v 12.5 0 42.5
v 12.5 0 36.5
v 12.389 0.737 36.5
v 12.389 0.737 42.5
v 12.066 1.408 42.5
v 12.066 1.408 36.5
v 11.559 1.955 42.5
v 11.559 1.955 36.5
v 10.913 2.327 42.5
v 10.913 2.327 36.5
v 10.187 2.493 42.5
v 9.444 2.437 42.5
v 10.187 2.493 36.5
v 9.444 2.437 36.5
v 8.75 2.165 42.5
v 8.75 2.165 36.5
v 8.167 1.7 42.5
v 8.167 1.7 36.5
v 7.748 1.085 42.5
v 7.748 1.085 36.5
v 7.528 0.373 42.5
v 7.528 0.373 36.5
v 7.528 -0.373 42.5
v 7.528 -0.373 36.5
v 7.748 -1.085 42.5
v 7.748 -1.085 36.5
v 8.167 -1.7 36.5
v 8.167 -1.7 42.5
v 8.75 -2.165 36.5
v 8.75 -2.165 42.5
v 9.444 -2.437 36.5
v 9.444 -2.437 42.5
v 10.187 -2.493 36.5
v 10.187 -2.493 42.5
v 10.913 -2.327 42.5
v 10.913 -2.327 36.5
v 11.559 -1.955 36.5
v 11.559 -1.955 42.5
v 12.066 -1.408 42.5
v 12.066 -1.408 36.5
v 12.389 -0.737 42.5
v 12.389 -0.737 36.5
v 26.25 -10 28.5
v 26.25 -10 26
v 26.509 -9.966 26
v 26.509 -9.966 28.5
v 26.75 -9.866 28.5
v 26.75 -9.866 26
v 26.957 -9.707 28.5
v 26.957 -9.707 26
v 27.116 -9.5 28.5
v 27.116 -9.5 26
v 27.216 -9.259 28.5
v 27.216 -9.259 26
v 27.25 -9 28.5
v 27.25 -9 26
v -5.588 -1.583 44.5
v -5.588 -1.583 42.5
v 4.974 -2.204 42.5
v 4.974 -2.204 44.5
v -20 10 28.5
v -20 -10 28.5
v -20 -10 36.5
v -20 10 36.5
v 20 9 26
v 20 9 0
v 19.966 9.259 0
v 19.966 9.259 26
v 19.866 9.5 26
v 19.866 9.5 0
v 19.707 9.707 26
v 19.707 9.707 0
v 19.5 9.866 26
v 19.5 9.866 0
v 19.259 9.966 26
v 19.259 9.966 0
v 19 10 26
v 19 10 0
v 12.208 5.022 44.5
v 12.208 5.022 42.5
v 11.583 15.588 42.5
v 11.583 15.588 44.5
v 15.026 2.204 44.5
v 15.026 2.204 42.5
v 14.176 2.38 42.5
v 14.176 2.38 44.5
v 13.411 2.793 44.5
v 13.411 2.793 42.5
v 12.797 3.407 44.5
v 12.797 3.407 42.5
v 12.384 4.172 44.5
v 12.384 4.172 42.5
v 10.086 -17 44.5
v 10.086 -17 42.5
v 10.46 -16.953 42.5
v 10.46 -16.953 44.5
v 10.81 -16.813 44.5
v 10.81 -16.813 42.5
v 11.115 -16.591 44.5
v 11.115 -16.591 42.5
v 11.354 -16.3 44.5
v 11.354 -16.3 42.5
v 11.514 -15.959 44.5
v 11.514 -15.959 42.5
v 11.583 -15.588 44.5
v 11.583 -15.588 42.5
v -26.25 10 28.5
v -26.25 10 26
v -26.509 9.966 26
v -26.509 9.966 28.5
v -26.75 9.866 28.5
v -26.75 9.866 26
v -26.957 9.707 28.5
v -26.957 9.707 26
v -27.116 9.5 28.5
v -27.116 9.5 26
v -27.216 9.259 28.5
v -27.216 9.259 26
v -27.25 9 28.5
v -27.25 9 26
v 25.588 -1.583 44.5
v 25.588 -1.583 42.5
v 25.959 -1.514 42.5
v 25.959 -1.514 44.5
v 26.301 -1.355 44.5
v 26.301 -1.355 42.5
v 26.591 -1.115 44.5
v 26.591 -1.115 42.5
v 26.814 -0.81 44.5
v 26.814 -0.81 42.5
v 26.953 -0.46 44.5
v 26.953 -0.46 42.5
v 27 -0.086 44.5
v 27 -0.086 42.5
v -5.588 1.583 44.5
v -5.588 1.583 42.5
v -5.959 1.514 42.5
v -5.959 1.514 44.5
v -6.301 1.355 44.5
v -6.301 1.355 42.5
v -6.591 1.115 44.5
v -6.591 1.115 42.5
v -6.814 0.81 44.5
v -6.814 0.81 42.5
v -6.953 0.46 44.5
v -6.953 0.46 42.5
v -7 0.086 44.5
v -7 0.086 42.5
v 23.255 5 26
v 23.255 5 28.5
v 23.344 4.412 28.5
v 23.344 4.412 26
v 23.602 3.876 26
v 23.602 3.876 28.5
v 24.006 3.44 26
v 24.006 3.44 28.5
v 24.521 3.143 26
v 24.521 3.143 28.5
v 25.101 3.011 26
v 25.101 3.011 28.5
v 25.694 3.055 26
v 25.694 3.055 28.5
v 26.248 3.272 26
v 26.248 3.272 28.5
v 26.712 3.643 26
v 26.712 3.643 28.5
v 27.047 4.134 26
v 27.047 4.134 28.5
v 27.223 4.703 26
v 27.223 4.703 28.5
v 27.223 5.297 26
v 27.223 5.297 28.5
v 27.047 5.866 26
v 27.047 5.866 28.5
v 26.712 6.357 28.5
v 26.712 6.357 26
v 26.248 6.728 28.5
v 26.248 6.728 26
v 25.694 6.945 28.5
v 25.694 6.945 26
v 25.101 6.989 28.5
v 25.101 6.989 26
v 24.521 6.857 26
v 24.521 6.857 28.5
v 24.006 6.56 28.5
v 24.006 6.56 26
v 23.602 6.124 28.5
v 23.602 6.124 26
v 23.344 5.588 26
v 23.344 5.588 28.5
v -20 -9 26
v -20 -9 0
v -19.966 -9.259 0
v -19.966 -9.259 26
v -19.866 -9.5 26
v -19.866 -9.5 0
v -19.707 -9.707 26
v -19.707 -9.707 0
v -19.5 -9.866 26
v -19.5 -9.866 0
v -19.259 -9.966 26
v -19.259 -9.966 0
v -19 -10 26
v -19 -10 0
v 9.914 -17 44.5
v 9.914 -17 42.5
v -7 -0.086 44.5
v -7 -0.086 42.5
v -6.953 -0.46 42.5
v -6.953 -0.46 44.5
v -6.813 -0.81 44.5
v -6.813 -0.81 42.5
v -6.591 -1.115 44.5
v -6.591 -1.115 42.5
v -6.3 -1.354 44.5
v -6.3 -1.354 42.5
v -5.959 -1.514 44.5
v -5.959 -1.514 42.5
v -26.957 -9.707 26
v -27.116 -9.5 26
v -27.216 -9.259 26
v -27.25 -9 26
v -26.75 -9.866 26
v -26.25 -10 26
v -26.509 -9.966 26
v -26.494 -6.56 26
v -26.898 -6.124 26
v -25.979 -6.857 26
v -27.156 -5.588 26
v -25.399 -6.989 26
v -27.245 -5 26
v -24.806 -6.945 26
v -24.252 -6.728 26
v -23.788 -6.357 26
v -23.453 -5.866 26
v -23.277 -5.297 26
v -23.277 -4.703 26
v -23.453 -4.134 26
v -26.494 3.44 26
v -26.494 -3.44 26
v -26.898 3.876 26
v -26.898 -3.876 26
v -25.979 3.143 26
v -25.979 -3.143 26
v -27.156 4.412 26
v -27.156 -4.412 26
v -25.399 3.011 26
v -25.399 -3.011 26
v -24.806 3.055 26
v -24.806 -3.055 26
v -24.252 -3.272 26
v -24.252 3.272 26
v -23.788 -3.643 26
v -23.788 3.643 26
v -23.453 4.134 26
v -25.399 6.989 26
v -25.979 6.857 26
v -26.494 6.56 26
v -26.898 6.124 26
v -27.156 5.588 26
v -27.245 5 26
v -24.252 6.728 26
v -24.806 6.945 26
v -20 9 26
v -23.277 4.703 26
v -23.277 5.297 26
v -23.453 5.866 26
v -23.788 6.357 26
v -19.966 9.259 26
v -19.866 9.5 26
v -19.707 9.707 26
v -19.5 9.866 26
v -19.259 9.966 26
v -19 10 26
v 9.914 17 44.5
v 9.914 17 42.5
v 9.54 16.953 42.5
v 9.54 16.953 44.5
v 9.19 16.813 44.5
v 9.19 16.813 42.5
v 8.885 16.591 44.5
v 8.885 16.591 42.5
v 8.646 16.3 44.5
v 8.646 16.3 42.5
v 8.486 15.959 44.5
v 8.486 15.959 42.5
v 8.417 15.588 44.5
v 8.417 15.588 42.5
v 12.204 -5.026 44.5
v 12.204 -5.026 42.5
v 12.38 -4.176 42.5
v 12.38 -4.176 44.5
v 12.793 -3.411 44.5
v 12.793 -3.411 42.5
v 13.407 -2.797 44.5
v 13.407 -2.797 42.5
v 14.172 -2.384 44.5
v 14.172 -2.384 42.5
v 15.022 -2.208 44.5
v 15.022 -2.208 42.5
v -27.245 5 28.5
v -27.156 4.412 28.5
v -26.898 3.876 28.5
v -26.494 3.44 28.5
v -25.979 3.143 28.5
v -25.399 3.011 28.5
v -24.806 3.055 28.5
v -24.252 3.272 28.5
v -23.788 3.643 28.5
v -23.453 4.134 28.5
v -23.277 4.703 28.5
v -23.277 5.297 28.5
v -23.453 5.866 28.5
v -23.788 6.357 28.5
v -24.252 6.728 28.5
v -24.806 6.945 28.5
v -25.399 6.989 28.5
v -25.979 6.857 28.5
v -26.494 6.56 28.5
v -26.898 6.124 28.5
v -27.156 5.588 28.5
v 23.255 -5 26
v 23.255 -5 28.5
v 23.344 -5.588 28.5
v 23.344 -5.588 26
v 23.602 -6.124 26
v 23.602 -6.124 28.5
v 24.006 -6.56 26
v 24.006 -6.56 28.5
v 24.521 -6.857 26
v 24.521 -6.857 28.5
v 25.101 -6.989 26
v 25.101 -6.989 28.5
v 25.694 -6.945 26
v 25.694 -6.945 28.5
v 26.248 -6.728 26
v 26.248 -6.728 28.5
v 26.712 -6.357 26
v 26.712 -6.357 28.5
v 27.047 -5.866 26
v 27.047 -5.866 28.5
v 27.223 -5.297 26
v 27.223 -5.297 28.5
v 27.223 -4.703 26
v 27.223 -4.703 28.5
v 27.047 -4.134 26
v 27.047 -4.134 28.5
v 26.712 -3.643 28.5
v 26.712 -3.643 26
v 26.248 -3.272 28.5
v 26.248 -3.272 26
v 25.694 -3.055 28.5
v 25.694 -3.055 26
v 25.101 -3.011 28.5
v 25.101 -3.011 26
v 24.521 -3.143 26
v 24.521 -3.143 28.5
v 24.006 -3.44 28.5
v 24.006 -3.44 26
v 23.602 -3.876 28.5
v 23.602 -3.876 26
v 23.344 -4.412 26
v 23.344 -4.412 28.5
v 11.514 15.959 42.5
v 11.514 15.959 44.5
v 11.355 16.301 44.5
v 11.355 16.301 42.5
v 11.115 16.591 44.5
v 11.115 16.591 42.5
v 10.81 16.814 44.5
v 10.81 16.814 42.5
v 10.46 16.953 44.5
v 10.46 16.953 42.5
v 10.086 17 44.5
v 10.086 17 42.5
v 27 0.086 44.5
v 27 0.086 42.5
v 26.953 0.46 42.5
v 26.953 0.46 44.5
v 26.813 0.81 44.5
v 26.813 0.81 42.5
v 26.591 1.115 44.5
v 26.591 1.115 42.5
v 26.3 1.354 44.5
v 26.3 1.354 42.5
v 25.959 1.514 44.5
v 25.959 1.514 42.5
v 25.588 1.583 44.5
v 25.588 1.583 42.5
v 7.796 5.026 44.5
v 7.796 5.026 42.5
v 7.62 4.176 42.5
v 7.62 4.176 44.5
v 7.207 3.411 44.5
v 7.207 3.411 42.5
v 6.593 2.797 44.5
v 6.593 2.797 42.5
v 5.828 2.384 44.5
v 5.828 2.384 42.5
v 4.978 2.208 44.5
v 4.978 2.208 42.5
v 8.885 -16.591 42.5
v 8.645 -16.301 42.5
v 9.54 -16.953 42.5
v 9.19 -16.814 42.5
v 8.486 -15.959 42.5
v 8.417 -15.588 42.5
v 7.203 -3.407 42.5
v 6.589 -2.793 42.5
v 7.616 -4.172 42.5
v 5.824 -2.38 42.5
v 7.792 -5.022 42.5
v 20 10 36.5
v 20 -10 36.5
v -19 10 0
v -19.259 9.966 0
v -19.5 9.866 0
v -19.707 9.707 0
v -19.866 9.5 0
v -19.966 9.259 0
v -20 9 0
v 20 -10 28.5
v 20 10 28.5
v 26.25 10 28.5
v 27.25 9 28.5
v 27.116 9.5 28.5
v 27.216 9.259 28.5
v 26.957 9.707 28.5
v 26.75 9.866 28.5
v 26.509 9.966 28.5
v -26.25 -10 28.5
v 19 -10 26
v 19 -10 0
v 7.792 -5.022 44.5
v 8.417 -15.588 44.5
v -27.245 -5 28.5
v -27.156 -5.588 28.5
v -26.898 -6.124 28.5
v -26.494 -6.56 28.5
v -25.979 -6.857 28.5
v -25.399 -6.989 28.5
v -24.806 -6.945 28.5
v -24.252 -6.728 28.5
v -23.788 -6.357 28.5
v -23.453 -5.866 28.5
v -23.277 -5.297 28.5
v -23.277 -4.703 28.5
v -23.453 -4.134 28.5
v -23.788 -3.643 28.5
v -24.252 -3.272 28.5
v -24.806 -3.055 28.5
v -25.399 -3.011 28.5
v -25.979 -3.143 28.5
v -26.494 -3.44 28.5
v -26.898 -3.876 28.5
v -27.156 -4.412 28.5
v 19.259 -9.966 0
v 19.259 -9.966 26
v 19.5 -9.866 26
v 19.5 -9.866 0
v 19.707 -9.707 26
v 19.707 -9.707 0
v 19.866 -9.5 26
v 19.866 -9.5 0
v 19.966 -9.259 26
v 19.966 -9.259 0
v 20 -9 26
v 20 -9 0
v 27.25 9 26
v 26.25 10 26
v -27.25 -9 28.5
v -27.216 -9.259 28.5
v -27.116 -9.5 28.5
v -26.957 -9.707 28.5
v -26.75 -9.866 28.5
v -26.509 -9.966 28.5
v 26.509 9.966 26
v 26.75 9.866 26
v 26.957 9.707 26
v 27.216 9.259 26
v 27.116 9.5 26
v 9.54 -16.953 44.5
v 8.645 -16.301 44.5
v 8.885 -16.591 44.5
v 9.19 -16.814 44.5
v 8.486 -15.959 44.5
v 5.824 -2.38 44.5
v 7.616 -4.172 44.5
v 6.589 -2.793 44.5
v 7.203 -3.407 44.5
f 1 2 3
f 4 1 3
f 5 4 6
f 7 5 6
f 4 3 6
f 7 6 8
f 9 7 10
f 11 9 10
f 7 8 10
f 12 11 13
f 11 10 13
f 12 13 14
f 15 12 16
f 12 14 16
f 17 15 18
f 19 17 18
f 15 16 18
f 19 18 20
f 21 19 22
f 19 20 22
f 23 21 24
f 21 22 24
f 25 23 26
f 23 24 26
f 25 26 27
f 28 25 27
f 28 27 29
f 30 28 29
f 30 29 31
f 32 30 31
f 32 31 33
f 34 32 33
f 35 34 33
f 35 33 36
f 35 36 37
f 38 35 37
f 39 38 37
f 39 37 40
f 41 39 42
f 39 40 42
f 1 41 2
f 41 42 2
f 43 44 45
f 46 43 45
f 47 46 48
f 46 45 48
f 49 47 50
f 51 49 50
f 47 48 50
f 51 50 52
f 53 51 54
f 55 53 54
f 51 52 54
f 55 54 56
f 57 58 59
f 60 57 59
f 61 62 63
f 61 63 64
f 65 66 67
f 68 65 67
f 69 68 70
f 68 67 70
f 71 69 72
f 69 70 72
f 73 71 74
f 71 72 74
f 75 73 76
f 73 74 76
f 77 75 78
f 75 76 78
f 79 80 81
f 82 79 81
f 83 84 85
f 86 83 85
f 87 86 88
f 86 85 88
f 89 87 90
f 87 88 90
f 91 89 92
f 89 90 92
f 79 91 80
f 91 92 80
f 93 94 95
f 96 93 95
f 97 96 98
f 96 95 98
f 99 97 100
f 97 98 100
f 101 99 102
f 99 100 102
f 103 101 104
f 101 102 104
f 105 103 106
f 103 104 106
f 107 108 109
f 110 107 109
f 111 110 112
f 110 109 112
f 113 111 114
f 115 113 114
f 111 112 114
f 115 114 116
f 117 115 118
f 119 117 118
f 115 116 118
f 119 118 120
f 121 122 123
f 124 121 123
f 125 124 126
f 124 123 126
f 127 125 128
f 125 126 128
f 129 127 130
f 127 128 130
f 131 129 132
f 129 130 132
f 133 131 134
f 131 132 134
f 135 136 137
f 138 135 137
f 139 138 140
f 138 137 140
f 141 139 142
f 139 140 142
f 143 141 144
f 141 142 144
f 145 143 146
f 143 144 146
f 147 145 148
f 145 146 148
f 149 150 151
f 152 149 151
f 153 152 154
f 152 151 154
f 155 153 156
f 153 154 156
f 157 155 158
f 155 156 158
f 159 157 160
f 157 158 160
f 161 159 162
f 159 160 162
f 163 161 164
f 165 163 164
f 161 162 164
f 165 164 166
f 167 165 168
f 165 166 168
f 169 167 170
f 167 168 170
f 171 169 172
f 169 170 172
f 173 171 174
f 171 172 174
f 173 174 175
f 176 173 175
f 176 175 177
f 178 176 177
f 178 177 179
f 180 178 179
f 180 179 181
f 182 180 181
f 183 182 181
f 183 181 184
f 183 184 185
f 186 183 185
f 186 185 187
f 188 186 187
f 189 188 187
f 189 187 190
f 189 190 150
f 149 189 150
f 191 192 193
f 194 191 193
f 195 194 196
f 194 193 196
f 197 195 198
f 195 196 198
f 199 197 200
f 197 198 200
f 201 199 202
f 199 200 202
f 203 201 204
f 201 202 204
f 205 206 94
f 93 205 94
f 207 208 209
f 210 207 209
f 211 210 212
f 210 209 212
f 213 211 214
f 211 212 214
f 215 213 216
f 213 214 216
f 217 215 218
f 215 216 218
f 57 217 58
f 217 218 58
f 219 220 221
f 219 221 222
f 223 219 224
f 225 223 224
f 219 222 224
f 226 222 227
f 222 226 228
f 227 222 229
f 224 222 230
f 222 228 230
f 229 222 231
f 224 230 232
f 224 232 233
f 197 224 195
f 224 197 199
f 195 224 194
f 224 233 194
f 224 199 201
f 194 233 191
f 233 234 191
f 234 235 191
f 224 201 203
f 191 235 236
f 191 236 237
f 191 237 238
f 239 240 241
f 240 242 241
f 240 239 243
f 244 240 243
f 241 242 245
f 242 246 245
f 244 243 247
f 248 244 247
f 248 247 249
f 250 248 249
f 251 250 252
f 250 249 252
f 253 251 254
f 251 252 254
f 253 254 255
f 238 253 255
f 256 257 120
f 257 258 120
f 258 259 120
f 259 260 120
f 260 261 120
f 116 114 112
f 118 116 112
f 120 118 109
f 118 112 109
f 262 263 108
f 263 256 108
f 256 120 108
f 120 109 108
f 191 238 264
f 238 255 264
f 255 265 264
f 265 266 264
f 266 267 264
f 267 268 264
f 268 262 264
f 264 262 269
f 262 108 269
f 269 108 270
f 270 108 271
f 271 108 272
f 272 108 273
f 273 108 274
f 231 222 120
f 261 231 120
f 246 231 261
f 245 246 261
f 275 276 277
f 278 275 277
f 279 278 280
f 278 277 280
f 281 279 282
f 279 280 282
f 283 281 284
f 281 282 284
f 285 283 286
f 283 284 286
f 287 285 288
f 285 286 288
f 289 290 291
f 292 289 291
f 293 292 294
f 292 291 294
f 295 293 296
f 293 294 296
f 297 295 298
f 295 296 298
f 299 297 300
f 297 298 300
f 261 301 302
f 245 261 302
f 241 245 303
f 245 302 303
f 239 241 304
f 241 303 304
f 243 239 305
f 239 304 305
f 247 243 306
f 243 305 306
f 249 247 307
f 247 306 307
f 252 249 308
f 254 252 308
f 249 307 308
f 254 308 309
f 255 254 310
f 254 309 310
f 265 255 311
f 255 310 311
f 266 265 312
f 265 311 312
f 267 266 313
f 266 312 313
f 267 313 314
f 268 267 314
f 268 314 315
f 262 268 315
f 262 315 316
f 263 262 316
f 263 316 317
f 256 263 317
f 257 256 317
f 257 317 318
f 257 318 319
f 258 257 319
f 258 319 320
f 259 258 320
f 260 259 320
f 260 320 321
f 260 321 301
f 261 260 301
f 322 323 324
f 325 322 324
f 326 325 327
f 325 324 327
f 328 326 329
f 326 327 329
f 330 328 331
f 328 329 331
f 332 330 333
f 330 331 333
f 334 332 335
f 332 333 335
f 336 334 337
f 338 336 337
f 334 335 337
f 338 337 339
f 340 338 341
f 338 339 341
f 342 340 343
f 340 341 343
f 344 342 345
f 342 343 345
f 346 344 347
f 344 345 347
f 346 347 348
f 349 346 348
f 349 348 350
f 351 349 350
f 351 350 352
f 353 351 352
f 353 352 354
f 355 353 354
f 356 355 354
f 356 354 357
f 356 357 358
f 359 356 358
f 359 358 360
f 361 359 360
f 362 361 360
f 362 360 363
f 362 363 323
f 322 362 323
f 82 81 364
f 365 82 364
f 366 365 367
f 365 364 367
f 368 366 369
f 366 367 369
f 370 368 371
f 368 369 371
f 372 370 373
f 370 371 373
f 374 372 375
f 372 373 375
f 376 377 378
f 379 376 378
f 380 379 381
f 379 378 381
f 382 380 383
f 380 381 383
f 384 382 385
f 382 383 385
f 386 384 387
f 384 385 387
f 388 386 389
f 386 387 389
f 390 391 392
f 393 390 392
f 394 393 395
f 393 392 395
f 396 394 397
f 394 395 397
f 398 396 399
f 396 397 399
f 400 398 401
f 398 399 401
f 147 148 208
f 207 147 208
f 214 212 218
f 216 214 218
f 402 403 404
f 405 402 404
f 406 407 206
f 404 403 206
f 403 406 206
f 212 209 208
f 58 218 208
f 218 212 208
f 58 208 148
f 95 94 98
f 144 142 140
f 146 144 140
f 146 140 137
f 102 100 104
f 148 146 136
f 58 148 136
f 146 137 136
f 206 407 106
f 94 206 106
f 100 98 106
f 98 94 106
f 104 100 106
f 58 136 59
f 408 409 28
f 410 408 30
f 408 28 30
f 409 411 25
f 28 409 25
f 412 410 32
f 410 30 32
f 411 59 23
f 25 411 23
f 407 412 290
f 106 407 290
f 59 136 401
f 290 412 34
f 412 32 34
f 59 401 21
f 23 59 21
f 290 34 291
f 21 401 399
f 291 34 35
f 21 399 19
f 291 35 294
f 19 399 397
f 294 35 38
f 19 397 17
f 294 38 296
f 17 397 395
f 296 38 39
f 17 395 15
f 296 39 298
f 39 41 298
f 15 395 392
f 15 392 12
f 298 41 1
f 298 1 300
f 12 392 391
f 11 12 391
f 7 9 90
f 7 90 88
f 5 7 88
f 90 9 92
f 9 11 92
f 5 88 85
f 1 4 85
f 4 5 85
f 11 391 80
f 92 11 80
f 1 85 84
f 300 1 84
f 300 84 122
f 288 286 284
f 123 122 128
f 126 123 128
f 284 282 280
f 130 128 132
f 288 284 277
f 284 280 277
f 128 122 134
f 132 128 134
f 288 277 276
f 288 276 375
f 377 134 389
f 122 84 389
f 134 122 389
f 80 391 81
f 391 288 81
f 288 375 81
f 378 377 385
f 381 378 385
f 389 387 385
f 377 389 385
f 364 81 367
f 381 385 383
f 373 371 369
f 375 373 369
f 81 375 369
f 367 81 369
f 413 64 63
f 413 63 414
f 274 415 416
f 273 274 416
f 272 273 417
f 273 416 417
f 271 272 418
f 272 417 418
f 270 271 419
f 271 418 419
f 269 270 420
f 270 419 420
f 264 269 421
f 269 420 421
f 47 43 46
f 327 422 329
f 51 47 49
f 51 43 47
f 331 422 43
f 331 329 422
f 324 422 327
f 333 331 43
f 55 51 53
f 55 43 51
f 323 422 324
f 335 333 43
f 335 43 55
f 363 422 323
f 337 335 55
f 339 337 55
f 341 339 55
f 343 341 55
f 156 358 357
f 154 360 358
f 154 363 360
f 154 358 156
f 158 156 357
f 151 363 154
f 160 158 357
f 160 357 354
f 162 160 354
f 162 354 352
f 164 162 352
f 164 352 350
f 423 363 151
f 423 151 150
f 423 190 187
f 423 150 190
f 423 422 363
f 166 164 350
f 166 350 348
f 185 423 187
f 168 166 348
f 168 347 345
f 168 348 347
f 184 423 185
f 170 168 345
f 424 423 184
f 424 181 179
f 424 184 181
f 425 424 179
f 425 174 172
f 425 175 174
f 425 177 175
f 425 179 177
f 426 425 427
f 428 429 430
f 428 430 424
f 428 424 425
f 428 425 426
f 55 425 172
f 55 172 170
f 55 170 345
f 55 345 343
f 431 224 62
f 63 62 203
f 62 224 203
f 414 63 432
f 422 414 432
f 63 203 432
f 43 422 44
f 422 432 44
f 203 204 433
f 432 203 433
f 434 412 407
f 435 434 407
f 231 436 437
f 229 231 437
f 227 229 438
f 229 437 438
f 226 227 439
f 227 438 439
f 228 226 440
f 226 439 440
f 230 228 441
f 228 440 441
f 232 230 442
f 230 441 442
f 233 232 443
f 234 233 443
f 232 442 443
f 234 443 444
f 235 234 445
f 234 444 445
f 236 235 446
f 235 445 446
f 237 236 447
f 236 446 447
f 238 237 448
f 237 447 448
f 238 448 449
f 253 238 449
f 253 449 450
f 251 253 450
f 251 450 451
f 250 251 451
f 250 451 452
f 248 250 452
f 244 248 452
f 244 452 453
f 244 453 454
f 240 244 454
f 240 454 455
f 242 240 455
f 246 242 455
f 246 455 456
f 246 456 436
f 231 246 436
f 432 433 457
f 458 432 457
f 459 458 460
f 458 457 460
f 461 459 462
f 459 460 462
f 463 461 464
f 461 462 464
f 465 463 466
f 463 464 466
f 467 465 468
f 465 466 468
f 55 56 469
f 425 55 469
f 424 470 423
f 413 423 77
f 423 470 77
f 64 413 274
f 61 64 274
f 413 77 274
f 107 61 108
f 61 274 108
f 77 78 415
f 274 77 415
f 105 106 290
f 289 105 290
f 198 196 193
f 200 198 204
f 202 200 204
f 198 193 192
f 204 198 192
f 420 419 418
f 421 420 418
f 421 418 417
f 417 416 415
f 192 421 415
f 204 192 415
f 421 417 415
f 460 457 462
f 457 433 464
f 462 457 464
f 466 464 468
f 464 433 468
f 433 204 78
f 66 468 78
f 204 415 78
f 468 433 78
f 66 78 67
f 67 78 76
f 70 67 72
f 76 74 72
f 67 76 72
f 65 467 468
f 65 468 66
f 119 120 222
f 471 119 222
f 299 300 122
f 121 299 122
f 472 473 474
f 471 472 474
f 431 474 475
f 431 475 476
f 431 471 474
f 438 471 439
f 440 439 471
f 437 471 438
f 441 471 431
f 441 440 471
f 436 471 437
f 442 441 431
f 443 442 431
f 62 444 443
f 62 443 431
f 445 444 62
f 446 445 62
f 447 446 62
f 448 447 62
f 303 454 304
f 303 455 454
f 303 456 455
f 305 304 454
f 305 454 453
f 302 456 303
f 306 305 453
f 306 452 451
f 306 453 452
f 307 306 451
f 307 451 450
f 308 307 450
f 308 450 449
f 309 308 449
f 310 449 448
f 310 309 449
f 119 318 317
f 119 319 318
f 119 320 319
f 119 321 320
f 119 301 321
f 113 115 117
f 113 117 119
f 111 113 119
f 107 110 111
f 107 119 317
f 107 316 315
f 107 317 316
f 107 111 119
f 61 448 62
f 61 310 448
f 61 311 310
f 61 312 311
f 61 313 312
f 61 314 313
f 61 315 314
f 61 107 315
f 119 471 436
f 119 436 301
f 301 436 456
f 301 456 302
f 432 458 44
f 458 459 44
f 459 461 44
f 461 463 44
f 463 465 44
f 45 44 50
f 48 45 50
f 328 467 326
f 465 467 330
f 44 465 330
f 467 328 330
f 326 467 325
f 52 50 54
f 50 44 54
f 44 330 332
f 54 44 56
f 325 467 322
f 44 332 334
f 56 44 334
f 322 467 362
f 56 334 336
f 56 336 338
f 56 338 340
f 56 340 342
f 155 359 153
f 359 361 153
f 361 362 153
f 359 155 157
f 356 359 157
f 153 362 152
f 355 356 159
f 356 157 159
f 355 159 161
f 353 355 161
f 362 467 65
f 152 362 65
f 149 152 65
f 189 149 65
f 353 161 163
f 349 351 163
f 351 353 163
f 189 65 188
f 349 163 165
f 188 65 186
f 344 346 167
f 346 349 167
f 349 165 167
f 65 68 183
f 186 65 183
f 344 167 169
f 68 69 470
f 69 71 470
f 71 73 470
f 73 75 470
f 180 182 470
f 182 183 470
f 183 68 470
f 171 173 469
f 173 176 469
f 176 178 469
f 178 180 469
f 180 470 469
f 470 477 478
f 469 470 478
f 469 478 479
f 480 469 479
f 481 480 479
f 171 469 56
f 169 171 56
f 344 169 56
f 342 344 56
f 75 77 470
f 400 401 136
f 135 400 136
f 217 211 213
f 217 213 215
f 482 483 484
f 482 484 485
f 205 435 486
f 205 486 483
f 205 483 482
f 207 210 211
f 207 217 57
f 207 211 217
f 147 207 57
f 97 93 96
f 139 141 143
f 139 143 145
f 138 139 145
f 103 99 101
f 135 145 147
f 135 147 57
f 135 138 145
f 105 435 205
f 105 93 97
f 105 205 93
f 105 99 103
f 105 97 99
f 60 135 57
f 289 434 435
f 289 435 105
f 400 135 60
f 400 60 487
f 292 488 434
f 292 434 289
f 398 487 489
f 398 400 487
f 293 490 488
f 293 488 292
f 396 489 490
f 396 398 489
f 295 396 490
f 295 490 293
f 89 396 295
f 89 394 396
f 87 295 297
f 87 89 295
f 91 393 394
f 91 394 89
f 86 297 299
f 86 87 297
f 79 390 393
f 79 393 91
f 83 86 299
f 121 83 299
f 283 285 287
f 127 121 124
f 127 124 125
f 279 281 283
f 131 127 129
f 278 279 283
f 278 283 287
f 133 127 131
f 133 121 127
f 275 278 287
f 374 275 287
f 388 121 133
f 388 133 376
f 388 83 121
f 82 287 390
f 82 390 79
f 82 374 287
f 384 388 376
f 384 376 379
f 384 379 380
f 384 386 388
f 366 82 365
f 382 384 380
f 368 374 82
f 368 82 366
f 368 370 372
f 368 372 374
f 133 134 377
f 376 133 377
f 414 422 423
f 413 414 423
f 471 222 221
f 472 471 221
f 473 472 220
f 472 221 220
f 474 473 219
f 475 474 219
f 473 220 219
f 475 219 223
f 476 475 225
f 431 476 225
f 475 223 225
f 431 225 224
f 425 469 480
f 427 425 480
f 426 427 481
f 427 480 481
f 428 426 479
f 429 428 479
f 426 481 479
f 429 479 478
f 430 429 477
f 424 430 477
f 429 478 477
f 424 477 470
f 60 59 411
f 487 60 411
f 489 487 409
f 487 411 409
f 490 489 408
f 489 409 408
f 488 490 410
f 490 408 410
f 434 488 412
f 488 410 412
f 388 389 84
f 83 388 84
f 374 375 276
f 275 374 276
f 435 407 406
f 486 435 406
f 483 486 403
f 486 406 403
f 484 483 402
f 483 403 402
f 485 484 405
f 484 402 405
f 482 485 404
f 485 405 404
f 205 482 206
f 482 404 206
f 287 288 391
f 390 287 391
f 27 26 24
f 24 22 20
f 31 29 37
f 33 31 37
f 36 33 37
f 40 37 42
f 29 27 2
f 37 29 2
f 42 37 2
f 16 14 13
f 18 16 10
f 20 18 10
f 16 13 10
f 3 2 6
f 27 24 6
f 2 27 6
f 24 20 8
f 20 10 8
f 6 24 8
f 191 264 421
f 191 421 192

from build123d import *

# Parameters (mm, degrees)
F1_DEPTH  = 26
F3_DEPTH  = 2.5
F4_D      = 3.99
F4_DEPTH  = 5
F5_W      = 40
F5_H      = 20
F6_DEPTH  = 8
F7_R      = 2.5
F8_DEPTH  = 6
F10_DEPTH = 2


with BuildPart() as f1:
    # F0 (on Top) → F1 (new body)
    with BuildSketch(Plane.XY):
        with BuildLine():
            Line((-19, -10), (19, -10))
            ThreePointArc((19, -10), (19.707107, -9.707107), (20, -9))
            Line((20, -9), (20, 9))
            ThreePointArc((20, 9), (19.707107, 9.707107), (19, 10))
            Line((19, 10), (-19, 10))
            ThreePointArc((-19, 10), (-19.707107, 9.707107), (-20, 9))
            Line((-20, 9), (-20, -9))
            ThreePointArc((-20, -9), (-19.707107, -9.707107), (-19, -10))
        make_face()
    extrude(amount=F1_DEPTH)

    # F2 (on face) → F3 (join)
    with BuildSketch(Plane.XY.offset(26)):
        with BuildLine():
            Line((-26.25, -10), (26.25, -10))
            ThreePointArc((26.25, -10), (26.957107, -9.707107), (27.25, -9))
            Line((27.25, -9), (27.25, 9))
            ThreePointArc((27.25, 9), (26.957107, 9.707107), (26.25, 10))
            Line((26.25, 10), (-26.25, 10))
            ThreePointArc((-26.25, 10), (-26.957107, 9.707107), (-27.25, 9))
            Line((-27.25, 9), (-27.25, -9))
            ThreePointArc((-27.25, -9), (-26.957107, -9.707107), (-26.25, -10))
        make_face()
    extrude(amount=F3_DEPTH)

    # F4
    with Locations(Plane(origin=(0, 0, 26), x_dir=(1, 0, 0), z_dir=(0, 0, -1))):
        with Locations((-25.25, 5), (-25.25, -5), (25.25, 5), (25.25, -5)):
            Hole(F4_D / 2, depth=F4_DEPTH)

    # F5 (on face) → F6 (join)
    with BuildSketch(Plane.XY.offset(28.5)):
        Rectangle(F5_W, F5_H)
    extrude(amount=F6_DEPTH)


with BuildPart() as f8:
    # F7 (on face) → F8 (new body)
    with BuildSketch(Plane.XY.offset(36.5)):
        with Locations((10, 0)):
            Circle(F7_R)
    extrude(amount=F8_DEPTH)

    # F9 (on face) → F10 (join)
    with BuildSketch(Plane.XY.offset(42.5)):
        with BuildLine():
            ThreePointArc((-5.588466, 1.583393), (-6.591489, 1.114912), (-7, 0.086004))
            Line((-7, 0.086004), (-7, -0.085642))
            ThreePointArc((-7, -0.085642), (-6.591358, -1.114689), (-5.588083, -1.583054))
            Line((-5.588083, -1.583054), (4.973742, -2.204338))
            ThreePointArc((4.973742, -2.204338), (6.918625, -3.07757), (7.792354, -5.02223))
            Line((7.792354, -5.02223), (8.416607, -15.588466))
            ThreePointArc((8.416607, -15.588466), (8.885088, -16.591489), (9.913996, -17))
            Line((9.913996, -17), (10.085642, -17))
            ThreePointArc((10.085642, -17), (11.114689, -16.591358), (11.583054, -15.588083))
            Line((11.583054, -15.588083), (12.204338, -5.026258))
            ThreePointArc((12.204338, -5.026258), (13.07757, -3.081375), (15.02223, -2.207646))
            Line((15.02223, -2.207646), (25.588466, -1.583393))
            ThreePointArc((25.588466, -1.583393), (26.591489, -1.114912), (27, -0.086004))
            Line((27, -0.086004), (27, 0.085642))
            ThreePointArc((27, 0.085642), (26.591358, 1.114689), (25.588083, 1.583054))
            Line((25.588083, 1.583054), (15.026258, 2.204338))
            ThreePointArc((15.026258, 2.204338), (13.081375, 3.07757), (12.207646, 5.02223))
            Line((12.207646, 5.02223), (11.583393, 15.588466))
            ThreePointArc((11.583393, 15.588466), (11.114912, 16.591489), (10.086004, 17))
            Line((10.086004, 17), (9.914358, 17))
            ThreePointArc((9.914358, 17), (8.885311, 16.591358), (8.416946, 15.588083))
            Line((8.416946, 15.588083), (7.795662, 5.026258))
            ThreePointArc((7.795662, 5.026258), (6.92243, 3.081375), (4.97777, 2.207646))
            Line((4.97777, 2.207646), (-5.588466, 1.583393))
        make_face()
    extrude(amount=F10_DEPTH)


solid = Compound([f1.part, f8.part])
